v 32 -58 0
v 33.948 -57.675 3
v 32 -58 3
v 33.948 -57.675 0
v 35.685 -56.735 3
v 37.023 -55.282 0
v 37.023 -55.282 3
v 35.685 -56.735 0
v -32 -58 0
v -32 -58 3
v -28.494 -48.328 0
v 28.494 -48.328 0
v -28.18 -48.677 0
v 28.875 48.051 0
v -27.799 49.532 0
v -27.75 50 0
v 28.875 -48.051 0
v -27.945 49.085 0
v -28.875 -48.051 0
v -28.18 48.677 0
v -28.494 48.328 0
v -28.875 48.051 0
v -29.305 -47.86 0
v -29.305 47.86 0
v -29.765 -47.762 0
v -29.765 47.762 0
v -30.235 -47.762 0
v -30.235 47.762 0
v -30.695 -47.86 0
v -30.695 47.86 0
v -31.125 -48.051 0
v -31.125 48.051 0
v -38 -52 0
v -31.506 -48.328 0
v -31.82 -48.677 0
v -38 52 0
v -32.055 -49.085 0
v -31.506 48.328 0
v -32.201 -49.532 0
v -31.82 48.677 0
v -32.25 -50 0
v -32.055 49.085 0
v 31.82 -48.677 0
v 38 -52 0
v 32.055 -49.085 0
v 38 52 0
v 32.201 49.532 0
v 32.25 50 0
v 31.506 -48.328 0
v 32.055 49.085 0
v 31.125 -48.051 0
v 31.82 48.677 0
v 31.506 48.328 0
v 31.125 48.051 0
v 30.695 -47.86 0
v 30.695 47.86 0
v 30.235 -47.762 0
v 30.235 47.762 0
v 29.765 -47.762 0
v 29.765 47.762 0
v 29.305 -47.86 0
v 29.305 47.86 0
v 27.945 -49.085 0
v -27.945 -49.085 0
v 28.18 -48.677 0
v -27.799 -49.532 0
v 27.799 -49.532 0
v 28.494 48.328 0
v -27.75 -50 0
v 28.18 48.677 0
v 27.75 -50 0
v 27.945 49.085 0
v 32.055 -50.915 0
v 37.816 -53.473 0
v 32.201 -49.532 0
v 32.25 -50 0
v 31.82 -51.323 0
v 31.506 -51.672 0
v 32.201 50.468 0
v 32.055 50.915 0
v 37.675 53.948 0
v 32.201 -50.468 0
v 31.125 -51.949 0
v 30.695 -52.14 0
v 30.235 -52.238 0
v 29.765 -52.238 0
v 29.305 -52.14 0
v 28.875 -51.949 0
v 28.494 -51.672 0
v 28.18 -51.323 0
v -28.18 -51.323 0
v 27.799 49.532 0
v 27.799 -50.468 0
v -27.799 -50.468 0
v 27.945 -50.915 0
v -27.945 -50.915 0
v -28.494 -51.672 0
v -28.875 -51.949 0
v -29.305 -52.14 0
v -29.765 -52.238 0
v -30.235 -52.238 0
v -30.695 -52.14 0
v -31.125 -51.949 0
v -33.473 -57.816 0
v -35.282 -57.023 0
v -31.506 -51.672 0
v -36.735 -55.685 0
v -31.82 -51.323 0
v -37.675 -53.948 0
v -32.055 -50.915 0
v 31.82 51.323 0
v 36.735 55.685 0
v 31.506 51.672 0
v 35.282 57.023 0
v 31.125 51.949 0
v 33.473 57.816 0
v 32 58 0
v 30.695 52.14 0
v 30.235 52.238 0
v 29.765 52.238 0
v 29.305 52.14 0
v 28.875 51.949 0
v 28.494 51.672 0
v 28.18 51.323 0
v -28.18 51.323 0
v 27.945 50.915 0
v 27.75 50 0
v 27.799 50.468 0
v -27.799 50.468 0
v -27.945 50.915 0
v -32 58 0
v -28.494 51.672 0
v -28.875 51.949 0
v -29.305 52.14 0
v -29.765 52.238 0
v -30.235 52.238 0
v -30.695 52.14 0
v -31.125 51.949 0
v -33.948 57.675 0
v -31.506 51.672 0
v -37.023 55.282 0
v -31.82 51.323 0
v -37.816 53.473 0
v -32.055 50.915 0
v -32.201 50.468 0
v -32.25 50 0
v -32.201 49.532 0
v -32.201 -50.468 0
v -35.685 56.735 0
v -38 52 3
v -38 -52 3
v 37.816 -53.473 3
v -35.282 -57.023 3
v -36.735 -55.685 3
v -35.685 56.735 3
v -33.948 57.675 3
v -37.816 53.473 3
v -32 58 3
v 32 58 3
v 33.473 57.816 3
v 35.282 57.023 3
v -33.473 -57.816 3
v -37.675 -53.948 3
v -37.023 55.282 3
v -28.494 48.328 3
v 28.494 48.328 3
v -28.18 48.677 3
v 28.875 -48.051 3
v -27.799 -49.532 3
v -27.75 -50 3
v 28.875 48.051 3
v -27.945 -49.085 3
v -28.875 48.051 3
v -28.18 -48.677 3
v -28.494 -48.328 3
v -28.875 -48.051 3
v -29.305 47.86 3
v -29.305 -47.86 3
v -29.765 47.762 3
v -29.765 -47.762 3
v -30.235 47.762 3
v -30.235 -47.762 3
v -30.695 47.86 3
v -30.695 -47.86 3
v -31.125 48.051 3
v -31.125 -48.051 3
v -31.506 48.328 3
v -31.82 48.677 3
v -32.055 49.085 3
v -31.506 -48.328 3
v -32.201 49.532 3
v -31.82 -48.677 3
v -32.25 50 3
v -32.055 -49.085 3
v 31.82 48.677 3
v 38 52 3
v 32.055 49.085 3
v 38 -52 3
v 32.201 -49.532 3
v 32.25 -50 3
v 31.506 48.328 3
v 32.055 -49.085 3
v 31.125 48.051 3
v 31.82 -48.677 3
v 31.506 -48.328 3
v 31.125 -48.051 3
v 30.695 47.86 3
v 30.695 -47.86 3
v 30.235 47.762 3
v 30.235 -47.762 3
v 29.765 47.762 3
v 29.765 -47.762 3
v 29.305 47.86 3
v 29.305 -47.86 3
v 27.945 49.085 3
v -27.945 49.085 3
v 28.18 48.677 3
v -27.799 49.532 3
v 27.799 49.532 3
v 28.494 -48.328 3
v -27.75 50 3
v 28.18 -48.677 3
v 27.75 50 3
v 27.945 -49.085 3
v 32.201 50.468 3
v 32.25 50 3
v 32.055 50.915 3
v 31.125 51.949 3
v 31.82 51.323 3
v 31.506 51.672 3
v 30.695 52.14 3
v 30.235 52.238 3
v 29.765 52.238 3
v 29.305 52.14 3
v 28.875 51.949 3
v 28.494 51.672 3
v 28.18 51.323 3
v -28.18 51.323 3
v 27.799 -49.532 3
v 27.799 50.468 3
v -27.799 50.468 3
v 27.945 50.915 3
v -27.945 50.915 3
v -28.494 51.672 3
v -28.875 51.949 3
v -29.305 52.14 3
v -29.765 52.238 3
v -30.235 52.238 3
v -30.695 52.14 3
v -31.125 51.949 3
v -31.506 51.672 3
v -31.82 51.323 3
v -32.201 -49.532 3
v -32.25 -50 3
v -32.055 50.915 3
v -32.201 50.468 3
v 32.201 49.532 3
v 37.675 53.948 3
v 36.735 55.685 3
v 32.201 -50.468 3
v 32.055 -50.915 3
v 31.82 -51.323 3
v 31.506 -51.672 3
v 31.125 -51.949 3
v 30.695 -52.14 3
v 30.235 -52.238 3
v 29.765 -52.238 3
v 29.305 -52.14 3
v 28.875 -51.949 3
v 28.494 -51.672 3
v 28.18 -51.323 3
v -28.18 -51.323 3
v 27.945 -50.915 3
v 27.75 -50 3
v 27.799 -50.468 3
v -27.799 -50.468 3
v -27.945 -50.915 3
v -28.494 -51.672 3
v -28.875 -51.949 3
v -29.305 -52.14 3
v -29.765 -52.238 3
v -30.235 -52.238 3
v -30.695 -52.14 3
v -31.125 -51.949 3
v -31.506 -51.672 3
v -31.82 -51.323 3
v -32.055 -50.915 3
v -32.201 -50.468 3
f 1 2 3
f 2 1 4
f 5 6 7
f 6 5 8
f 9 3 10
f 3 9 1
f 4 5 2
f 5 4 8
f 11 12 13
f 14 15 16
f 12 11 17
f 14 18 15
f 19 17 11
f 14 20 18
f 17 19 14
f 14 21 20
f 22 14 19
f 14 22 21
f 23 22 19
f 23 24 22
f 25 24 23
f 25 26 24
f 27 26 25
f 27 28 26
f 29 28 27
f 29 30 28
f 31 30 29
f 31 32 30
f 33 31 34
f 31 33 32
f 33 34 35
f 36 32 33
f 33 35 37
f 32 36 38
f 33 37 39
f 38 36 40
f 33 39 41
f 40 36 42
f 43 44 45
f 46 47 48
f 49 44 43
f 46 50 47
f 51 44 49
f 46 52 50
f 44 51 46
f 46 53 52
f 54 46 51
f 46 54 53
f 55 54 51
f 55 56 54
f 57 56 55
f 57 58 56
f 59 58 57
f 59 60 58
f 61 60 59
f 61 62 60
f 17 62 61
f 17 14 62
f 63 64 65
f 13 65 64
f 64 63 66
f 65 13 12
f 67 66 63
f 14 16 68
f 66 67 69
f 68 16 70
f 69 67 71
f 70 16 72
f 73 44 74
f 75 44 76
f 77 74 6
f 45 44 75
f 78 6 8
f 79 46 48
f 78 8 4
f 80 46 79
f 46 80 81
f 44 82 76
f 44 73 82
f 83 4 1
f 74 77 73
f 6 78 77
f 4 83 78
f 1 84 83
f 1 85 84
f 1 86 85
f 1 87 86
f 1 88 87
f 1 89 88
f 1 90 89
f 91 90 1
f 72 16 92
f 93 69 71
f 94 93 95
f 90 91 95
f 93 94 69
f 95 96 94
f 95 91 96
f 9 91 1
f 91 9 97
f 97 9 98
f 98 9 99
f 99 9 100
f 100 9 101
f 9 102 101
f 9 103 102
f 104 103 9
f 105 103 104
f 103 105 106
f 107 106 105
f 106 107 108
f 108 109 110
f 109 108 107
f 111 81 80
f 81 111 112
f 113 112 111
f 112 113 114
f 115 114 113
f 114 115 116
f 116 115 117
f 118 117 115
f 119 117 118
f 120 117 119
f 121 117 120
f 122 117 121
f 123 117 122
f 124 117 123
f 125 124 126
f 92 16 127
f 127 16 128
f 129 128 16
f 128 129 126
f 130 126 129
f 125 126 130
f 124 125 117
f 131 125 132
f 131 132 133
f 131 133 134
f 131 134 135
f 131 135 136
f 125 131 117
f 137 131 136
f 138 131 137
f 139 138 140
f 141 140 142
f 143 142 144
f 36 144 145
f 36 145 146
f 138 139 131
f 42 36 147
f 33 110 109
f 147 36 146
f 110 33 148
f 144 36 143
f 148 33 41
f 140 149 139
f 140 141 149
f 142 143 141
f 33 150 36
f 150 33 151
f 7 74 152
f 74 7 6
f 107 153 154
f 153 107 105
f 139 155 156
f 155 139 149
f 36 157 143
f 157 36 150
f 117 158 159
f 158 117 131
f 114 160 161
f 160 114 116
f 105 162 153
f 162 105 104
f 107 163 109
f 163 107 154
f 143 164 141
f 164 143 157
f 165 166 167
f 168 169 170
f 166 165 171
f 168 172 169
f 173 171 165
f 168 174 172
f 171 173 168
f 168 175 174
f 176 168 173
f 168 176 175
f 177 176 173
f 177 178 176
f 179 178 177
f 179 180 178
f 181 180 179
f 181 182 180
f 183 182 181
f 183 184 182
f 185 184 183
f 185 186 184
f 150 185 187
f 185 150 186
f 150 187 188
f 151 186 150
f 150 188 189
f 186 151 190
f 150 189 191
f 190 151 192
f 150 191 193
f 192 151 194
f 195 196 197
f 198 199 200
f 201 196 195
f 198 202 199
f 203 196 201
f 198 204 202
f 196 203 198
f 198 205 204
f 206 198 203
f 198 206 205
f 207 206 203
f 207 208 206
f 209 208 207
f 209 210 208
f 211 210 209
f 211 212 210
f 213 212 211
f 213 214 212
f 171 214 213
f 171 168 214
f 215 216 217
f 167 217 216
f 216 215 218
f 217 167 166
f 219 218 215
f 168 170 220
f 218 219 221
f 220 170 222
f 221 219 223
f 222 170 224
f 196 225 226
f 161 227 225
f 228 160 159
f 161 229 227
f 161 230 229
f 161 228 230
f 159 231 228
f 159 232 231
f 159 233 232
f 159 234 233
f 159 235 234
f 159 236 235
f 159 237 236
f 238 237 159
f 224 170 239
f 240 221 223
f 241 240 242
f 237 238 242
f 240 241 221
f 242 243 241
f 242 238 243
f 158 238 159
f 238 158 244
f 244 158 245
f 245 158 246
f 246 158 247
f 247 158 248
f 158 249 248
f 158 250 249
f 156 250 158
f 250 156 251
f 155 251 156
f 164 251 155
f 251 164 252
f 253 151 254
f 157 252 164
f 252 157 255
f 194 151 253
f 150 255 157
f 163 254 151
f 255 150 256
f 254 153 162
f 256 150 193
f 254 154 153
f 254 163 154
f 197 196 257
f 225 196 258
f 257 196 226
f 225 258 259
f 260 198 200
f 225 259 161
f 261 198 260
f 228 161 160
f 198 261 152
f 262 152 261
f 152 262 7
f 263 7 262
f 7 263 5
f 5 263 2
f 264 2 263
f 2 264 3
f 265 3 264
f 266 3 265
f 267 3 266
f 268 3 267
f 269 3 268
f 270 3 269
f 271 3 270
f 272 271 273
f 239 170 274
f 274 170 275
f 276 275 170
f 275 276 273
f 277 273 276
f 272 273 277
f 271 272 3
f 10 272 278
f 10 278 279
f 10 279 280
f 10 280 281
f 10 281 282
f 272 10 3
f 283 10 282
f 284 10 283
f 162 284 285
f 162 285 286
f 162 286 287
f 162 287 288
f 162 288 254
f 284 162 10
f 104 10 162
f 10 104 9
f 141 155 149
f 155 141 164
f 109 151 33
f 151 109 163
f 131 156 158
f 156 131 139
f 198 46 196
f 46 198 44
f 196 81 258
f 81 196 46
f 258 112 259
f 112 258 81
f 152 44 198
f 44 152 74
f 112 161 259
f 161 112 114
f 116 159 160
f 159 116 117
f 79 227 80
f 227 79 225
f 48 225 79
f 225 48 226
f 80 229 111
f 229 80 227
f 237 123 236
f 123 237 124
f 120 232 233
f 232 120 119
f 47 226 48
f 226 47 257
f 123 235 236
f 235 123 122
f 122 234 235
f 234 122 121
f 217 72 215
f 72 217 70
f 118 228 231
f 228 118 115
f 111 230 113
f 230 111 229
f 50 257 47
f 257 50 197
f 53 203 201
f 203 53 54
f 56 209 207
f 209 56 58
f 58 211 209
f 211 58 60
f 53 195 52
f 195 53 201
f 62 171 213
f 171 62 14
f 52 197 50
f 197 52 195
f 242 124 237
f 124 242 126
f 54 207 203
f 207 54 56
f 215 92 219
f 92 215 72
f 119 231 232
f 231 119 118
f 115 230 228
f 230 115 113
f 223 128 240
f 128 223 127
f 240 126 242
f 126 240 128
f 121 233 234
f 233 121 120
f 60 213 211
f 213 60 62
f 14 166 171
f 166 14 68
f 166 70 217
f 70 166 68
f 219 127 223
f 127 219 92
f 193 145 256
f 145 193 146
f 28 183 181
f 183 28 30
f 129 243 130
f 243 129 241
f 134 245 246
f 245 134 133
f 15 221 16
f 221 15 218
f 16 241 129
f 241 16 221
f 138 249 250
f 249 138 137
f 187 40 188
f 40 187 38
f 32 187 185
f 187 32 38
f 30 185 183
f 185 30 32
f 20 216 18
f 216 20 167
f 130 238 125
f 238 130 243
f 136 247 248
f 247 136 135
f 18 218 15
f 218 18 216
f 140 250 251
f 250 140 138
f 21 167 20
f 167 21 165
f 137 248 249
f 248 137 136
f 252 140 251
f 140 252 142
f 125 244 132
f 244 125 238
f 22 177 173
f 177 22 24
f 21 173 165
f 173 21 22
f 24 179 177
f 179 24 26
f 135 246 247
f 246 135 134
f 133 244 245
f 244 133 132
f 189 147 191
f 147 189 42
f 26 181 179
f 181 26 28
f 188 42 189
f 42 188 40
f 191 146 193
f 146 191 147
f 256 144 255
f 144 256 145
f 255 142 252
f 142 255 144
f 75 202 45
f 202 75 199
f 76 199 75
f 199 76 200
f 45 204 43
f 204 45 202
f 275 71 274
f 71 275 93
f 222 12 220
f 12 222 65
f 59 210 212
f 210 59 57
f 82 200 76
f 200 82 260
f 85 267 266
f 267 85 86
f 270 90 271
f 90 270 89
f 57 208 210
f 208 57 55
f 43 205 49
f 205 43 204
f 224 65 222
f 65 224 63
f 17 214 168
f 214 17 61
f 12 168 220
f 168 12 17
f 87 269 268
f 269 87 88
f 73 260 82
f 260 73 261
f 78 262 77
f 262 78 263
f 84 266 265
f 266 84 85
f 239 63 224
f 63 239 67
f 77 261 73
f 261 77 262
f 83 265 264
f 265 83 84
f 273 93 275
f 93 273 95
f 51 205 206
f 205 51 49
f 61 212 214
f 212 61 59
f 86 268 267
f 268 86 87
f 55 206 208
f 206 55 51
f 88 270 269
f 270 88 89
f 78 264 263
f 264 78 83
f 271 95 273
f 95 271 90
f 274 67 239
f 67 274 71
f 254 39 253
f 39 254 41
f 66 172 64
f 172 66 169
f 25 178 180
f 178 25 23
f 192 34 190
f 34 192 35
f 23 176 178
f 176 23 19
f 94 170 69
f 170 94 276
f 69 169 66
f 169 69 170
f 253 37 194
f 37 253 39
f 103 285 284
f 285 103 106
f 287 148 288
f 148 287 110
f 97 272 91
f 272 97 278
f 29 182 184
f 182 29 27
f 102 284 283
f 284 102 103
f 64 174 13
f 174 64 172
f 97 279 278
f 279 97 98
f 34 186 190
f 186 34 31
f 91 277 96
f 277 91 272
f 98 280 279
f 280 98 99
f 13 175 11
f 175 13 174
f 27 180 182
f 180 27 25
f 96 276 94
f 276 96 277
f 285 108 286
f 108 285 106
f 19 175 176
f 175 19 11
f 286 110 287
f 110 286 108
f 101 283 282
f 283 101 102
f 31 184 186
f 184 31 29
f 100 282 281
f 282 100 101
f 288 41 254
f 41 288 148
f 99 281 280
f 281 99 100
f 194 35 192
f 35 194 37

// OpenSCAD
// ==========================
// PARAMETERS (easy to edit)
// ==========================

// Main box
BOX_W = 80;      // width  (X)
BOX_L = 120;     // length (Y)
BOX_H = 3;      // total height (Z)
WALL  = 4;       // wall / floor thickness
R     = 6;       // corner & edge radius (fillet)
HOLE_INSET = 10;
HOLE_DIAM = 4.5;
HOLE_FN = 30;

CON_W = 20;
CON_H = 10;

plate_width  = 100;  // X direction
plate_length = 150;  // Y direction
plate_thickness = 5; // Z direction

corner_radius = 8;   // radius of the rounded corners

// Main plate with rounded corners
difference(){
    linear_extrude(BOX_H)
        offset(r = R) 
            offset(r = -corner_radius) 
                square([BOX_W, BOX_L], center = true);
                
                
    // Optional mounting holes (uncomment if you want them)
     translate([ BOX_W/2 - HOLE_INSET,  BOX_L/2 - HOLE_INSET, -0.1]) 
        mounting_hole();
     translate([-BOX_W/2 + HOLE_INSET,  BOX_L/2 - HOLE_INSET, -0.1]) 
        mounting_hole();
     translate([ BOX_W/2 - HOLE_INSET, -BOX_L/2 + HOLE_INSET, -0.1]) 
        mounting_hole();
     translate([-BOX_W/2 + HOLE_INSET, -BOX_L/2 + HOLE_INSET, -0.1]) 
        mounting_hole();
    
    
    
}


module mounting_hole() {
    cylinder(h = BOX_H + 0.2, d = HOLE_DIAM, $fn=HOLE_FN);
}
